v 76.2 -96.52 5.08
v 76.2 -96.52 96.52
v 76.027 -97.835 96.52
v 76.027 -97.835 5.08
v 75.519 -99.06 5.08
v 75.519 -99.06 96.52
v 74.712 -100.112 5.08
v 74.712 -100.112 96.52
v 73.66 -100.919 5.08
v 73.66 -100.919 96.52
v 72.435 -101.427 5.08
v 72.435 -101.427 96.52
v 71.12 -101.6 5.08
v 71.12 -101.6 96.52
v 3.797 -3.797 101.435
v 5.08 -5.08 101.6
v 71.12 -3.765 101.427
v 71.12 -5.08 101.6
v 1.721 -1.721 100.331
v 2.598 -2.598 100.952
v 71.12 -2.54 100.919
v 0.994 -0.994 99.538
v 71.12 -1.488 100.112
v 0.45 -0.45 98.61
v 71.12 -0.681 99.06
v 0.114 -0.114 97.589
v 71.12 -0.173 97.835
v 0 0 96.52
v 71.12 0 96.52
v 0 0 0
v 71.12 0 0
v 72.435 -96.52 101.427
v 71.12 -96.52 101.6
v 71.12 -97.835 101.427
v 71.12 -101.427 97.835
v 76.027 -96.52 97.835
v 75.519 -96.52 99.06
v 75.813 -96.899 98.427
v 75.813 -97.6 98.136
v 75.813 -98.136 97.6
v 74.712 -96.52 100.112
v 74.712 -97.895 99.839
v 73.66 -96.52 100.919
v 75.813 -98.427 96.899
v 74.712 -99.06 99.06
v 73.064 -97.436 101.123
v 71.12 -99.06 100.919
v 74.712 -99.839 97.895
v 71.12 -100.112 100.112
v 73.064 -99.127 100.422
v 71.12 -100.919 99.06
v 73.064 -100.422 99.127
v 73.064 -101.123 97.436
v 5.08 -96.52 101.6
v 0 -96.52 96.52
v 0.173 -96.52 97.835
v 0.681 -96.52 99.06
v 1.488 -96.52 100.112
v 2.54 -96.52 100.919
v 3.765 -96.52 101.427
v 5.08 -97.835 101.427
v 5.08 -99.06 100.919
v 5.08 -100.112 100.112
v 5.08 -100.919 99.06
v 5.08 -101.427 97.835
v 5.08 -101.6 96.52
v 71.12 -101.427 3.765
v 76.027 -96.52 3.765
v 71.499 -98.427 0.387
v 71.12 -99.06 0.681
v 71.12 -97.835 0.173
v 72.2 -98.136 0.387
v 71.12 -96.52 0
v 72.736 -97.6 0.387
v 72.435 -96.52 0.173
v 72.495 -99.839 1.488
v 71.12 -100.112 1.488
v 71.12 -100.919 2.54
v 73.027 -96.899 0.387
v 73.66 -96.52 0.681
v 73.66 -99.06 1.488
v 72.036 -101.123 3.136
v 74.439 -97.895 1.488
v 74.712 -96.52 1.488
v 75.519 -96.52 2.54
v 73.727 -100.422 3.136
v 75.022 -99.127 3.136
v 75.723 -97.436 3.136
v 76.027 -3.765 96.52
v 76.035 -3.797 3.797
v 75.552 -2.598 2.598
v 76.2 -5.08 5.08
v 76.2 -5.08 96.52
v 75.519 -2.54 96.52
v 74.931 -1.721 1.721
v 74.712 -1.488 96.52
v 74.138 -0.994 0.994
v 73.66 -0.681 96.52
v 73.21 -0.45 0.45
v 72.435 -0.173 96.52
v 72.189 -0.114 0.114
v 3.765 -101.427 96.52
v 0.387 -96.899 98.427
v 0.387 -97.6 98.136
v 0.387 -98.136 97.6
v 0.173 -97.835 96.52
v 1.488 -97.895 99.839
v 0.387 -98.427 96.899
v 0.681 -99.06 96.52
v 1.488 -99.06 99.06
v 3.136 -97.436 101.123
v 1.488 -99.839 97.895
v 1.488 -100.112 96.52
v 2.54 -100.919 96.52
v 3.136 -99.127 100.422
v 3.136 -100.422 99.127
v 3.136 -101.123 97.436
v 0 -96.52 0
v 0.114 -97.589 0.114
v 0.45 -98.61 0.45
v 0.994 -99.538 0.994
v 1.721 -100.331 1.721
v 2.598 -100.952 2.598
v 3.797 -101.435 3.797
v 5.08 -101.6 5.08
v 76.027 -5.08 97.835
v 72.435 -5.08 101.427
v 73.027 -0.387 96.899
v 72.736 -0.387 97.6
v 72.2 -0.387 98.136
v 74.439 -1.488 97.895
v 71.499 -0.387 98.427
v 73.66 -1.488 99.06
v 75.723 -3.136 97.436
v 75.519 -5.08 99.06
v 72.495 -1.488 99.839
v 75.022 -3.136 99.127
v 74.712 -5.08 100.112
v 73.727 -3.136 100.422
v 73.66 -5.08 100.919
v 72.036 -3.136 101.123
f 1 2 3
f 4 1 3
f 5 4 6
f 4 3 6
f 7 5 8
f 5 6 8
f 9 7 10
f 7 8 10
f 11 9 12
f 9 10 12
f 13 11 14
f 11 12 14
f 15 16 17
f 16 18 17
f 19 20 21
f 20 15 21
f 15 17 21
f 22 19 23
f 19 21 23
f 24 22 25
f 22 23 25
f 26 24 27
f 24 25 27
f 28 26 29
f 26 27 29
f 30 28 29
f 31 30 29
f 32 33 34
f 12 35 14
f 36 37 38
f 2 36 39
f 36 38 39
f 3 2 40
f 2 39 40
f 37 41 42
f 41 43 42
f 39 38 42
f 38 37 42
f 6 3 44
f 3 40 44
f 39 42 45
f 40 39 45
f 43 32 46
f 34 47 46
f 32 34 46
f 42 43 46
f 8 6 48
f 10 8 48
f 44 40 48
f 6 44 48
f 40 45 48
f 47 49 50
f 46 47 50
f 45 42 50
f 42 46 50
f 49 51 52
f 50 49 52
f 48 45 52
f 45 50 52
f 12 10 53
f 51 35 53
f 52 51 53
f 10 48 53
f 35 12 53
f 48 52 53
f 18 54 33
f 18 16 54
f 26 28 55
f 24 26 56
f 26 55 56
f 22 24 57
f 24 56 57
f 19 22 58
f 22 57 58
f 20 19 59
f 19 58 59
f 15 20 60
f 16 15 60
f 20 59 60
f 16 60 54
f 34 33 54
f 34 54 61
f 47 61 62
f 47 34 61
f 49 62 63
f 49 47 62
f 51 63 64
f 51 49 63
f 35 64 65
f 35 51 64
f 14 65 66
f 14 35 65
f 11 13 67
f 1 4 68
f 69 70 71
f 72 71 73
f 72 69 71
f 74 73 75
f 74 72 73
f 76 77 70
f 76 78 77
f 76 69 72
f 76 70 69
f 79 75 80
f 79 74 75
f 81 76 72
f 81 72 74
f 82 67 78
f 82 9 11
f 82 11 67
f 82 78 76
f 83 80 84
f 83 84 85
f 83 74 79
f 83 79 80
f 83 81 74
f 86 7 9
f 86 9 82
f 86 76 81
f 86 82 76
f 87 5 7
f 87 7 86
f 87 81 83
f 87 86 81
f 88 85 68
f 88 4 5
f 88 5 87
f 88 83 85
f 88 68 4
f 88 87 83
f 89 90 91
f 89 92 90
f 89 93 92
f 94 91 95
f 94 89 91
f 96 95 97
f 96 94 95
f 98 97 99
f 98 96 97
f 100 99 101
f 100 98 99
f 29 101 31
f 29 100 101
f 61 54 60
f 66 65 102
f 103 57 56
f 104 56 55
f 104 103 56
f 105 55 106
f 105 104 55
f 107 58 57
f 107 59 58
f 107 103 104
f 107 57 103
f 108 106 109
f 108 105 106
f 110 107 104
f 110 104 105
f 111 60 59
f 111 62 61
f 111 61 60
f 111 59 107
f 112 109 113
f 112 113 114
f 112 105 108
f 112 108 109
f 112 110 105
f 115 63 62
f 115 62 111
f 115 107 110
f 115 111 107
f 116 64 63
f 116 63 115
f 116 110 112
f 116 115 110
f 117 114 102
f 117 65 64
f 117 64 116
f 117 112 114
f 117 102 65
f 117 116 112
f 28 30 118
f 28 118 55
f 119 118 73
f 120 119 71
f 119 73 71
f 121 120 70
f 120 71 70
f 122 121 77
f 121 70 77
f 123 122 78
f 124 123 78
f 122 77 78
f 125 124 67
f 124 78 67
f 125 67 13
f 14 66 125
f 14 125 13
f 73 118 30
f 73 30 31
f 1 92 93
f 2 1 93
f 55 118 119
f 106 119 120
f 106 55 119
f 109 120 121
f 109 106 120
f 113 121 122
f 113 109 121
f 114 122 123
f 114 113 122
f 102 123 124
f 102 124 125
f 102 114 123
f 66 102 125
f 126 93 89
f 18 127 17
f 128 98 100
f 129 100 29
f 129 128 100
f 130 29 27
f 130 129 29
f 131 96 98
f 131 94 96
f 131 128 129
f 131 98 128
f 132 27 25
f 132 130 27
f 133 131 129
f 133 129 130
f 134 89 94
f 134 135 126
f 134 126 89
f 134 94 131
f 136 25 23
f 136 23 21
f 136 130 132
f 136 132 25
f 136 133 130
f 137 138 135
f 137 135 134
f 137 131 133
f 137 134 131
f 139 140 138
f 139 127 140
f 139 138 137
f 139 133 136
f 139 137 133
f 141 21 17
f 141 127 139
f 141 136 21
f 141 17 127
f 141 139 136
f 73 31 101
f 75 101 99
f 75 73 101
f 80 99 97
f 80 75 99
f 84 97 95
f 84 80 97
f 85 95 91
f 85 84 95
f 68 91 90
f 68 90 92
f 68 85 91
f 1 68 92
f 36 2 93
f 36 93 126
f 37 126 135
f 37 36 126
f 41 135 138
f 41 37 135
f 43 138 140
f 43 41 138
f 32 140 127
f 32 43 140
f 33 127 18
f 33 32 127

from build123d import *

# Parameters (mm, degrees)
F0_W     = 76.2
F0_H     = 101.6
F1_DEPTH = 101.6
F2_R     = 5.08
F3_R     = 29.098806
F4_DEPTH = 76.2


with BuildPart() as f1:
    # F0 (on Front) → F1 (new body)
    with BuildSketch(Plane.XZ):
        with Locations((38.1, 50.8)):
            Rectangle(F0_W, F0_H)
    extrude(amount=F1_DEPTH)

    # F2
    f2_edges = [f1.edges().sort_by_distance(p)[0] for p in [
        (38.1, -101.6, 101.6),
        (0, -50.8, 101.6),
        (76.2, -50.8, 101.6),
        (76.2, -101.6, 50.8),
        (0, -101.6, 50.8),
        (38.1, -101.6, 0),
        (76.2, -50.8, 0),
        (76.2, 0, 50.8),
        (38.1, 0, 101.6),
    ]]
    fillet(f2_edges, radius=F2_R)

    # F3 (on face) → F4 (join)
    with BuildSketch(Plane.YZ.offset(76.2)):
        with Locations((-50.803576, 51.402752)):
            Circle(F3_R)
    extrude(amount=-F4_DEPTH)


solid = f1.part
